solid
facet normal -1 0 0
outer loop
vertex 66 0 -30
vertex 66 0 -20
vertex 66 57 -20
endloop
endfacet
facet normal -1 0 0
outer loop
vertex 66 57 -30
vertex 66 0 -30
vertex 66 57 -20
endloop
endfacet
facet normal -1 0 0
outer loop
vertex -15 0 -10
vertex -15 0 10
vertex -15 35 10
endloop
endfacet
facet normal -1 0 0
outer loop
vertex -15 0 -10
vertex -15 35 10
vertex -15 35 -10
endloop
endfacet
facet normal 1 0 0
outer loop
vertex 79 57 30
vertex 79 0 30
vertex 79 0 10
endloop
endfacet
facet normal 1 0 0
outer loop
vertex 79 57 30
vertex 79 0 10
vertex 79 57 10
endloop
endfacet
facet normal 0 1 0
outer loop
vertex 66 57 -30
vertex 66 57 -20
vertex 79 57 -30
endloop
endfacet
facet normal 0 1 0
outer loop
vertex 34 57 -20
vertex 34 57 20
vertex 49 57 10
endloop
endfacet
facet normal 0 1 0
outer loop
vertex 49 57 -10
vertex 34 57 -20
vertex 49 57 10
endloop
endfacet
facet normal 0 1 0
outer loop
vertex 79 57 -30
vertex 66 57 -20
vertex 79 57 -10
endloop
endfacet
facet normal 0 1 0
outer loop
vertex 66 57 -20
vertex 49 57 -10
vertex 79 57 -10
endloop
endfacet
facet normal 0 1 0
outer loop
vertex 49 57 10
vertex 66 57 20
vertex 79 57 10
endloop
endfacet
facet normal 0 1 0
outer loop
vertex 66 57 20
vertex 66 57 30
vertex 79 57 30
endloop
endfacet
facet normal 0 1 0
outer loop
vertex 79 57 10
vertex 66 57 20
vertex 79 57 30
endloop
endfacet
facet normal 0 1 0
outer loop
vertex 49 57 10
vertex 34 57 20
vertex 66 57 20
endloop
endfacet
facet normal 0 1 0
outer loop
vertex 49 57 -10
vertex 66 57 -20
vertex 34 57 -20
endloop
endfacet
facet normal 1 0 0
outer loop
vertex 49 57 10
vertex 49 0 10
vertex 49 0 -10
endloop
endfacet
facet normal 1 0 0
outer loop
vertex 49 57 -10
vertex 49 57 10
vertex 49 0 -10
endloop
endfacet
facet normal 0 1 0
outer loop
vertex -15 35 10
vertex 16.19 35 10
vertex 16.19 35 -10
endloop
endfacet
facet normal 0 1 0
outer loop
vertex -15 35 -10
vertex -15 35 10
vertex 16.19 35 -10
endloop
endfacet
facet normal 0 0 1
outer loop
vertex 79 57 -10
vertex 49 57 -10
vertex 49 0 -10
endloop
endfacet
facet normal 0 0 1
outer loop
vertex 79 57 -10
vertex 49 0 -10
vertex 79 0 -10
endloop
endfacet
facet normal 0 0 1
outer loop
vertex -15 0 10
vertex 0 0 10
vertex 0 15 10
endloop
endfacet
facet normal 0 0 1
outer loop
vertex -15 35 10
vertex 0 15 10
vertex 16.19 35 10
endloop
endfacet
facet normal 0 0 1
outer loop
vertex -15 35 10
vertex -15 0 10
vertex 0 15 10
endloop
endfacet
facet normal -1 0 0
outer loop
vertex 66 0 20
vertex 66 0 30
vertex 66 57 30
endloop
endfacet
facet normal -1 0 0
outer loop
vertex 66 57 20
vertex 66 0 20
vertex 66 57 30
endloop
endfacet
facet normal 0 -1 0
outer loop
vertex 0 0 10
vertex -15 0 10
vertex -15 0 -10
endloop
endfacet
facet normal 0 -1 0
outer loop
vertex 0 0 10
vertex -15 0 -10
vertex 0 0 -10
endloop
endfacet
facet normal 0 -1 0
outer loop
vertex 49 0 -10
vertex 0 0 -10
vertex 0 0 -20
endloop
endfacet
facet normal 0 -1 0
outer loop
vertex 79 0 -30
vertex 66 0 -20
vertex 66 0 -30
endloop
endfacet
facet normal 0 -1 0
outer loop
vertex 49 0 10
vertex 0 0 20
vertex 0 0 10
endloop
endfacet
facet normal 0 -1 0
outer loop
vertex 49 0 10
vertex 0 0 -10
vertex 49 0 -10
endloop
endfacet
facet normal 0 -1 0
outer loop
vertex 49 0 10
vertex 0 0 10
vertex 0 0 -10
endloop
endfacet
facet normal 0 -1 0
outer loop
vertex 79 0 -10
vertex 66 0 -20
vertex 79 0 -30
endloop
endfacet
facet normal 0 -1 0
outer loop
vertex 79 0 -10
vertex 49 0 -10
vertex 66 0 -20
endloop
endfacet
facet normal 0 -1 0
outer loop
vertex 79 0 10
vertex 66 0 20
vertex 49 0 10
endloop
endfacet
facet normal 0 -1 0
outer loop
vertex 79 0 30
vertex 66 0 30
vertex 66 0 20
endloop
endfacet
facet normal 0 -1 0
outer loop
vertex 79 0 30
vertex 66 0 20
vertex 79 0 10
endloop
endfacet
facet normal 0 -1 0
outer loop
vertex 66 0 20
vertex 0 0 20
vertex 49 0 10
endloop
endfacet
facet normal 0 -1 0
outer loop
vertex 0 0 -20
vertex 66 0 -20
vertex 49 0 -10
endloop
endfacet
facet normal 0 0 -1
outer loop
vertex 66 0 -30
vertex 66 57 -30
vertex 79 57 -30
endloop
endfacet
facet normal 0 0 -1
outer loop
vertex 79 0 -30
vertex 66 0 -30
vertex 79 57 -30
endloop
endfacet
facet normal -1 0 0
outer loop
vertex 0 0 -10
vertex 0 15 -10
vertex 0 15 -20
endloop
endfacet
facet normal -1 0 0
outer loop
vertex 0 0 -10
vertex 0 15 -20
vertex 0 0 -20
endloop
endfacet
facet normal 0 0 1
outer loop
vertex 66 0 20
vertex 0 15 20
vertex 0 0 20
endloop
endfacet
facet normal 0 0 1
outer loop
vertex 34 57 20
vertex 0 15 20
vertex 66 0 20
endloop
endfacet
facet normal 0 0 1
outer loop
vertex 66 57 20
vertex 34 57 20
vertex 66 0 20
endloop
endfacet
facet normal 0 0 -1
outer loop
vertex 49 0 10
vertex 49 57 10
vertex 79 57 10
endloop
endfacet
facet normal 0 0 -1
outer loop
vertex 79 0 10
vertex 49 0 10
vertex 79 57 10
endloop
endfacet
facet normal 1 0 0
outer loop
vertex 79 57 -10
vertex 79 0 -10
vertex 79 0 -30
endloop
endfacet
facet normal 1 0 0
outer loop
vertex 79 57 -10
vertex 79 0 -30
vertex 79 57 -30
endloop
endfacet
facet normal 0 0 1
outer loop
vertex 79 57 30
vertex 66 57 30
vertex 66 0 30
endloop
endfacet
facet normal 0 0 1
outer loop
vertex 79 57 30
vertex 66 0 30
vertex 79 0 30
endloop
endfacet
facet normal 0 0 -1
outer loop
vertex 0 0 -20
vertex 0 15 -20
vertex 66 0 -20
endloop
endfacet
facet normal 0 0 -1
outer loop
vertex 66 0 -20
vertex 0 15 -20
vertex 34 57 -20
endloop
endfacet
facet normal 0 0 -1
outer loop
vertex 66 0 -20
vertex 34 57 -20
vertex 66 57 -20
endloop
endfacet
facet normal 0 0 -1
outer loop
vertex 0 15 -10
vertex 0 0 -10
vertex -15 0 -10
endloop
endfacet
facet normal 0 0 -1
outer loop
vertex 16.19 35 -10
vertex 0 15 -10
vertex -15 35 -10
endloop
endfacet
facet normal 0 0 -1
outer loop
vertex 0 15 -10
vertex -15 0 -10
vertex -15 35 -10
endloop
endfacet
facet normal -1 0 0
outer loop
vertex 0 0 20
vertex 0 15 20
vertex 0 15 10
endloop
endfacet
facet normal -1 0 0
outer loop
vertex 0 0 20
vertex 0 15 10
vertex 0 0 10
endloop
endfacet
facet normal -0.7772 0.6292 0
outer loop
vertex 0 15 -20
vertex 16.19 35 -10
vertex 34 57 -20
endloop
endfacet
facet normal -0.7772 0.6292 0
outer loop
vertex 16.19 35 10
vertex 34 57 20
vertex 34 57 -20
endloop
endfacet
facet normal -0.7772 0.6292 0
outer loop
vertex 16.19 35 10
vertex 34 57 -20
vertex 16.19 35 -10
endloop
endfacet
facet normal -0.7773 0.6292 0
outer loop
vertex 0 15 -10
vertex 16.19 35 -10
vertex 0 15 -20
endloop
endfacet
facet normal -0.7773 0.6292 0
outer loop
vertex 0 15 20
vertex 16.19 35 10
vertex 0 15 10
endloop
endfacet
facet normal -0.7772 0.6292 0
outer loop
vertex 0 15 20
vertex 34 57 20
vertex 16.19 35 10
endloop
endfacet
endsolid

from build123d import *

# Parameters (mm, degrees)
BOSS_EXTRUDE1_DEPTH = 20
SKETCH2_W           = 13
SKETCH2_H           = 57
BOSS_EXTRUDE2_DEPTH = 30
SKETCH3_W           = 30
SKETCH3_H           = 20
CUT_EXTRUDE1_DEPTH  = 102.931349447
BOSS_EXTRUDE3_REACH = 118.931
BOSS_EXTRUDE3_START = -15
SKETCH5_W           = 20
SKETCH5_H           = 35


with BuildPart() as part:
    # Sketch1 → Boss-Extrude1 (new, symmetric)
    with BuildSketch(Plane.XY):
        Polygon((0, 0), (66, 0), (66, 57), (34, 57), (0, 15), align=None)
    extrude(amount=BOSS_EXTRUDE1_DEPTH, both=True)

    # Sketch2 → Boss-Extrude2 (add, symmetric)
    with BuildSketch(Plane.XY):
        with Locations((72.5, 28.5)):
            Rectangle(SKETCH2_W, SKETCH2_H)
    extrude(amount=BOSS_EXTRUDE2_DEPTH, both=True)

    # Sketch3 → Cut-Extrude1 (cut, through all)
    with BuildSketch(Plane(origin=(0, 0, 0), x_dir=(1, 0, 0), z_dir=(0, 1, 0))):
        with Locations((64, 0)):
            Rectangle(SKETCH3_W, SKETCH3_H)
    extrude(amount=CUT_EXTRUDE1_DEPTH, mode=Mode.SUBTRACT)

    # Sketch5 → Boss-Extrude3 (add, up to next)
    with BuildSketch(Plane(origin=(0, 0, 0), x_dir=(0, 0, -1), z_dir=(1, 0, 0)).offset(BOSS_EXTRUDE3_START), mode=Mode.PRIVATE) as boss_extrude3_sk1:
        with Locations((0, 17.5)):
            Rectangle(SKETCH5_W, SKETCH5_H)
    boss_extrude3_tool1 = extrude(boss_extrude3_sk1.sketch, amount=BOSS_EXTRUDE3_REACH, mode=Mode.PRIVATE) - part.part
    add(boss_extrude3_tool1.solids().sort_by_distance((-15, 17.5, 0))[0])


solid = part.part
